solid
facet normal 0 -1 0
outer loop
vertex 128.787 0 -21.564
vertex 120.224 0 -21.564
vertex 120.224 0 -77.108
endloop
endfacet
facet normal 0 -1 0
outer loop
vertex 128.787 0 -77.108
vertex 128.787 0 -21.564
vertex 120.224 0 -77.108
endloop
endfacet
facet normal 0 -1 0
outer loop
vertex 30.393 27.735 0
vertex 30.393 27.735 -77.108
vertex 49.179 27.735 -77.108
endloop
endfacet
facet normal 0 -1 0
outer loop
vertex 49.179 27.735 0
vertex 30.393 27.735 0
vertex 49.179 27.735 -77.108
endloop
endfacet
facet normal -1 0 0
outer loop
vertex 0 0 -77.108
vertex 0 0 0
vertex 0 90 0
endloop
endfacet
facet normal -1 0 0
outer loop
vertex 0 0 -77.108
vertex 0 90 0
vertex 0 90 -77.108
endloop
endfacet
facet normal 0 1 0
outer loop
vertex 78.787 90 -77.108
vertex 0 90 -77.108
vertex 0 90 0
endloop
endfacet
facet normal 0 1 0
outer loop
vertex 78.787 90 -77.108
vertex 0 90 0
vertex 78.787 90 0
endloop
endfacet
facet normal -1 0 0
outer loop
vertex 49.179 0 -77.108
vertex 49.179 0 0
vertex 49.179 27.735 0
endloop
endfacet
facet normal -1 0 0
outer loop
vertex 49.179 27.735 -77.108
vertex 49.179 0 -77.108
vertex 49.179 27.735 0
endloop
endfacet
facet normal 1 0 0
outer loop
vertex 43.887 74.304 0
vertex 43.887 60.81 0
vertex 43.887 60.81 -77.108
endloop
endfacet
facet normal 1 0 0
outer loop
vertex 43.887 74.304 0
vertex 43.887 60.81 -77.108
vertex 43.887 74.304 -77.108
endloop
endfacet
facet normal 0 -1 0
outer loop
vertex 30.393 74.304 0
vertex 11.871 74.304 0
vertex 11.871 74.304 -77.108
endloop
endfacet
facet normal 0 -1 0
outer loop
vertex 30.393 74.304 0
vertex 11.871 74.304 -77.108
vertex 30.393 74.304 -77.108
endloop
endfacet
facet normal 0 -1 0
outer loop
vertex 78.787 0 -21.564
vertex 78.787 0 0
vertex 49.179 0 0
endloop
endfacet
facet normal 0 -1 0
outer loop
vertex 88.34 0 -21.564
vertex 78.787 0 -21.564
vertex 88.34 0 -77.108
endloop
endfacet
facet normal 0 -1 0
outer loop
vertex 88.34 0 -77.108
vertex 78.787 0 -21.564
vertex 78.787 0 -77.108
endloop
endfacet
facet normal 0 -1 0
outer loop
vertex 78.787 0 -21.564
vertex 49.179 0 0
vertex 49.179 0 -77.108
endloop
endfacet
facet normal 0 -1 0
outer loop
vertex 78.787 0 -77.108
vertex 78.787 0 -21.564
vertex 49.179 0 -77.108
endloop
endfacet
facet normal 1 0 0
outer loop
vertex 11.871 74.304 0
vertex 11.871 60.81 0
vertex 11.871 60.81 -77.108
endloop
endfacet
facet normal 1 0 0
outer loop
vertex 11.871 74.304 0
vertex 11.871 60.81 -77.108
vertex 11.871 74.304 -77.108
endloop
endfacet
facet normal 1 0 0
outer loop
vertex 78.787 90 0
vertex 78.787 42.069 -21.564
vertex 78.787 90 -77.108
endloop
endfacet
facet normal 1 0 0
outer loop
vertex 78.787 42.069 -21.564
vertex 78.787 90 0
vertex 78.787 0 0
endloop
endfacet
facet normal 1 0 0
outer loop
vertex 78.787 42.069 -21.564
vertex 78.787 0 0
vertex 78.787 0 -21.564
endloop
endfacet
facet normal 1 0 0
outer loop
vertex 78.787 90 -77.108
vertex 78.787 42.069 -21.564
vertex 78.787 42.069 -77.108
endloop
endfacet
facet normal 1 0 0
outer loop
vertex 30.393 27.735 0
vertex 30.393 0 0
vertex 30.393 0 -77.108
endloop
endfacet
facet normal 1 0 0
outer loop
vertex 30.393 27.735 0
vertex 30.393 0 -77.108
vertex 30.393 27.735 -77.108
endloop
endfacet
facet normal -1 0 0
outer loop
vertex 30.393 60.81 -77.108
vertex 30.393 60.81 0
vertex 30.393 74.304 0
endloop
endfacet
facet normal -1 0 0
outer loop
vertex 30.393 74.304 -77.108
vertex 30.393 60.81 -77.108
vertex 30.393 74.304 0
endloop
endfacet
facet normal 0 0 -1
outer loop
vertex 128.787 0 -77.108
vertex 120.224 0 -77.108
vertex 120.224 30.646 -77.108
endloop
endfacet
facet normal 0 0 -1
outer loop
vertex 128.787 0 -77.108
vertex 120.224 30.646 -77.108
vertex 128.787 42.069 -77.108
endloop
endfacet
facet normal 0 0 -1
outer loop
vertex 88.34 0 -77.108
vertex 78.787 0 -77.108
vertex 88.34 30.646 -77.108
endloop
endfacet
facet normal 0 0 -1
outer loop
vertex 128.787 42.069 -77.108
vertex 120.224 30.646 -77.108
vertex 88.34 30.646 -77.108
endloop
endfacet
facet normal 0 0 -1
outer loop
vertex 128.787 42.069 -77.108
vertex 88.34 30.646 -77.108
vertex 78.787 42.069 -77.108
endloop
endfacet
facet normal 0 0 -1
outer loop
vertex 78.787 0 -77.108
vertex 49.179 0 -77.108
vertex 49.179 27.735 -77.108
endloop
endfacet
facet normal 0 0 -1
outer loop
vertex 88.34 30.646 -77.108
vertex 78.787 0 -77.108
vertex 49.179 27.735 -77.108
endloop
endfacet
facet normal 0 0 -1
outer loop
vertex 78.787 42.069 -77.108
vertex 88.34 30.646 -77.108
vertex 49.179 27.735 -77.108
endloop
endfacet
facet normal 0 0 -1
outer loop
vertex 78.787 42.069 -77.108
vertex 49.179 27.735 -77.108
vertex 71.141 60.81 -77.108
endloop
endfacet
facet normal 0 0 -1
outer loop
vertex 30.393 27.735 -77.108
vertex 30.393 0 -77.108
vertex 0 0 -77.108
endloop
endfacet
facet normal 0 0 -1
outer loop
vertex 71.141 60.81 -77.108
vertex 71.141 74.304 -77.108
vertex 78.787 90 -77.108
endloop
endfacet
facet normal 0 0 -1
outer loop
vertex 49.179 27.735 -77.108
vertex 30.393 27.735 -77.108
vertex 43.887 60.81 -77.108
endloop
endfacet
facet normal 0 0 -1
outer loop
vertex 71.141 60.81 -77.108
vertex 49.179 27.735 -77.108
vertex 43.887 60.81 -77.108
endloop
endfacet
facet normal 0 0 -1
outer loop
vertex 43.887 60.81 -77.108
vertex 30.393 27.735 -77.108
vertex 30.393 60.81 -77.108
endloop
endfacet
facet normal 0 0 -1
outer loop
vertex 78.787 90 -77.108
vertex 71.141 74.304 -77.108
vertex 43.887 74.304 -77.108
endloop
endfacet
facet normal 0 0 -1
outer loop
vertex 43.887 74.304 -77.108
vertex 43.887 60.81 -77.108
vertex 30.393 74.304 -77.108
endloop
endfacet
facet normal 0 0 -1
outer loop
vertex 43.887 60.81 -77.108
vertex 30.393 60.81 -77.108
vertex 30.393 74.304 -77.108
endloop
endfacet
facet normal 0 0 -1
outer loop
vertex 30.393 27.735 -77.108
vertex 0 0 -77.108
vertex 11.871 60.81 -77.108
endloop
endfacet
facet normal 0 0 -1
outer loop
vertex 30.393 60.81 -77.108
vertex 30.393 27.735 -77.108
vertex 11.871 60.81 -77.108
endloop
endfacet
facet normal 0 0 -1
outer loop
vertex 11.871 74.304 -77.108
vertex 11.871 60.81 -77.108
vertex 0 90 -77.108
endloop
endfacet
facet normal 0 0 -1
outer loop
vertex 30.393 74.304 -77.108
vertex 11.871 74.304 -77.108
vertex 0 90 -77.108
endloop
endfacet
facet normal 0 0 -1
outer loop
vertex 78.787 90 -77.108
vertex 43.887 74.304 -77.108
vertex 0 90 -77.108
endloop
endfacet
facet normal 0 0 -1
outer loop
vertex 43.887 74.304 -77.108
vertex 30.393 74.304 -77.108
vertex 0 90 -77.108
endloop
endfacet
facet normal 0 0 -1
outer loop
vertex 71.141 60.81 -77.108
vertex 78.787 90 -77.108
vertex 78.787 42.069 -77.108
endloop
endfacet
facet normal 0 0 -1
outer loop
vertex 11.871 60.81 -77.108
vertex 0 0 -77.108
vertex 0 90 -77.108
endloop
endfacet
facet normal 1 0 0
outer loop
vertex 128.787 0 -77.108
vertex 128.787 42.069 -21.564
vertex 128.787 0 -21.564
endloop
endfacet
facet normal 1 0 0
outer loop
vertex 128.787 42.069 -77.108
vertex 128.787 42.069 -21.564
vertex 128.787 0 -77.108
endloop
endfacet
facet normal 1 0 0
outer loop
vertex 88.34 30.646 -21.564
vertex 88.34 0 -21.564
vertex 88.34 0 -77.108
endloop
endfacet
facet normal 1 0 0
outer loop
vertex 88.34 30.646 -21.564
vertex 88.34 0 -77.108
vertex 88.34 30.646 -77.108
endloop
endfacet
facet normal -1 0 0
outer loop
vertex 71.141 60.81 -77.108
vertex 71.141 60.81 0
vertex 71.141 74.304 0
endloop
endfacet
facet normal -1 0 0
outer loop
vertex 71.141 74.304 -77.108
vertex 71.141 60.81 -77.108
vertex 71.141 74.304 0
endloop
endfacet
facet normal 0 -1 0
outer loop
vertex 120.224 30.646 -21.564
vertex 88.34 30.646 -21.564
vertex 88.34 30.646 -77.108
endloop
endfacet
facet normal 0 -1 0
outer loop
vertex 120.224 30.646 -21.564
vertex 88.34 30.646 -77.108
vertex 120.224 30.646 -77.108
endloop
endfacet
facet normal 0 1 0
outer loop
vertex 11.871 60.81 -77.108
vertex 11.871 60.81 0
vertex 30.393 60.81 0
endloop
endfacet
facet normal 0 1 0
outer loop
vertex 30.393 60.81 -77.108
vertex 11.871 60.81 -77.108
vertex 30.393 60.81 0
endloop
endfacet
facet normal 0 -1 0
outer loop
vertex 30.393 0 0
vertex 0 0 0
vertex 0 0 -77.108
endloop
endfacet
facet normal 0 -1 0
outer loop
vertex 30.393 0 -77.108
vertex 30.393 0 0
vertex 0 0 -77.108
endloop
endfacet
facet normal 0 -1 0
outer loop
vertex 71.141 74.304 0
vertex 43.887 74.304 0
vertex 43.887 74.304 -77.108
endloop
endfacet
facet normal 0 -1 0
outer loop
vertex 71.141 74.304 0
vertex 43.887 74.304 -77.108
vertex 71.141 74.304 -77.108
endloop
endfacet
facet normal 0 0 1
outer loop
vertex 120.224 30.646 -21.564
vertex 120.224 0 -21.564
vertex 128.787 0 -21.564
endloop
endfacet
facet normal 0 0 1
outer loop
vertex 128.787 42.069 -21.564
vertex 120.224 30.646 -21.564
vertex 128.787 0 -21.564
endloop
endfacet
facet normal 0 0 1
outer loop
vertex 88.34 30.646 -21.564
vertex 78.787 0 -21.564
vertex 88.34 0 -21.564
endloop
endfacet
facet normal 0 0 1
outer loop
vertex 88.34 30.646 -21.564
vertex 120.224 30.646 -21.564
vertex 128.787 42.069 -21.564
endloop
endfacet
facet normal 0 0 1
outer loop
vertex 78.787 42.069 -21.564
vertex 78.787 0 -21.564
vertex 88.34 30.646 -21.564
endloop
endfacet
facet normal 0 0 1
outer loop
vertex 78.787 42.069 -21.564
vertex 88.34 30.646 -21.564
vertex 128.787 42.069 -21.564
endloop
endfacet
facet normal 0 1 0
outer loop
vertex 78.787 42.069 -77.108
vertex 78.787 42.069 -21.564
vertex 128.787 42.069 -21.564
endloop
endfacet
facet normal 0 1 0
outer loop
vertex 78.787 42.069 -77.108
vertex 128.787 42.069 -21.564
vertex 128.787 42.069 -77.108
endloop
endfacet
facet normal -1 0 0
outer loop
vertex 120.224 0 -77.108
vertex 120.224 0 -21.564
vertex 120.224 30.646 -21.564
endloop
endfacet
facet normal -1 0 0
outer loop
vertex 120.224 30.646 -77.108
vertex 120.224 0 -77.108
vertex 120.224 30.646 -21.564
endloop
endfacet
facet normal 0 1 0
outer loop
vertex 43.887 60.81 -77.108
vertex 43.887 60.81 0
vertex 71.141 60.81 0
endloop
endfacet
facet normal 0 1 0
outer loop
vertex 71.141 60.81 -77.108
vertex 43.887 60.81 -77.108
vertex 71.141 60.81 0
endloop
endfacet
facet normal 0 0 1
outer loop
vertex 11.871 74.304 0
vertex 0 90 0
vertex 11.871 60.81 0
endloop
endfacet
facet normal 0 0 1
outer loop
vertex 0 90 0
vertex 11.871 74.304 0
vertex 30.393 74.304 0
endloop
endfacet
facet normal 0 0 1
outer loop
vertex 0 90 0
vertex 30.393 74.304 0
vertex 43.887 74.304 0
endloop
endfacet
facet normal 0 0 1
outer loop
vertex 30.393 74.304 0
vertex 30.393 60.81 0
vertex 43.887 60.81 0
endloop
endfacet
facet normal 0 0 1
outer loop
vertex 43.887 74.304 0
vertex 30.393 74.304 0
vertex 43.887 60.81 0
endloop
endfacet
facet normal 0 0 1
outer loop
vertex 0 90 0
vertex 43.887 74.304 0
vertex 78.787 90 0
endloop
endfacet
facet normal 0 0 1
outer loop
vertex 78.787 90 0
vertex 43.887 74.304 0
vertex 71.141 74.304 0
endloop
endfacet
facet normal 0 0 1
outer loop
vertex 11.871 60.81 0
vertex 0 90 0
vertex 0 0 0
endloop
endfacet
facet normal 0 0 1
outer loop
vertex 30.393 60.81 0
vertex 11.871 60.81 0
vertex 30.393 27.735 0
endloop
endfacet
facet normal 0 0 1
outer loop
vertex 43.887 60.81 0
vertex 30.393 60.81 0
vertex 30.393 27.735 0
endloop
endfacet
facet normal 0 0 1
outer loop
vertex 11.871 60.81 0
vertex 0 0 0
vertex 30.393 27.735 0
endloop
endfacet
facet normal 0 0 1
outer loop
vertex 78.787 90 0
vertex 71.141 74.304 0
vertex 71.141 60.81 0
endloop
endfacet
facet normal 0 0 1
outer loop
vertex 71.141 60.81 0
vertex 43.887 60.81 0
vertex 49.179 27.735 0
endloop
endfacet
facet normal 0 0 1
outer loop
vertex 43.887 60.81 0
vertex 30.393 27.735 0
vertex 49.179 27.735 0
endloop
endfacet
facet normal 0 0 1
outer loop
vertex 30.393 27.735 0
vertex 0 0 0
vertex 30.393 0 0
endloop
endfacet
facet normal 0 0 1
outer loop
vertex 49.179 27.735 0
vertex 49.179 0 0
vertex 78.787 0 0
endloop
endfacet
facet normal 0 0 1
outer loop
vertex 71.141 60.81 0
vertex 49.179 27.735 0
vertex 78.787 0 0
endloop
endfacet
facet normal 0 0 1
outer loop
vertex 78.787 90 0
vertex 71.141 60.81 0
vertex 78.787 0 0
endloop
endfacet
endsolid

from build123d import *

# Parameters (mm, degrees)
ESQUISSE1_W             = 78.786961771
ESQUISSE1_H             = 77.107895372
BOSS_EXTRU_1_DEPTH      = 90
ESQUISSE3_W             = 55.543823951
ESQUISSE3_H             = 42.068648109
BOSS_EXTRU_3_DEPTH      = 50
ESQUISSE4_W             = 18.786498619
ESQUISSE4_H             = 27.73494317
ESQUISSE4_W_2           = 31.884127938
ESQUISSE4_H_2           = 30.645527463
ESQUISSE4_W_3           = 18.521900048
ESQUISSE4_H_3           = 13.494527178
ESQUISSE4_W_4           = 27.253652927
ENL_V_MAT_EXTRU_1_DEPTH = 110


with BuildPart() as part:
    # Esquisse1 → Boss.-Extru.1 (new body)
    with BuildSketch(Plane(origin=(0, 0, 0), x_dir=(1, 0, 0), z_dir=(0, 1, 0))):
        with Locations((39.393480886, 38.553947686)):
            Rectangle(ESQUISSE1_W, ESQUISSE1_H)
    extrude(amount=BOSS_EXTRU_1_DEPTH)

    # Esquisse3 → Boss.-Extru.3 (add)
    with BuildSketch(Plane(origin=(78.786961771, 0, 0), x_dir=(0, 0, -1), z_dir=(1, 0, 0))):
        with Locations((49.335983396, 21.034324055)):
            Rectangle(ESQUISSE3_W, ESQUISSE3_H)
    extrude(amount=BOSS_EXTRU_3_DEPTH)

    # Esquisse4 → Enlèv. mat.-Extru.1 (cut)
    with BuildSketch(Plane.XY):
        with Locations((39.78581368, 13.867471585)):
            Rectangle(ESQUISSE4_W, ESQUISSE4_H)
        with Locations((104.28171563, 15.322763732)):
            Rectangle(ESQUISSE4_W_2, ESQUISSE4_H_2)
        with Locations((21.131614346, 67.557028272)):
            Rectangle(ESQUISSE4_W_3, ESQUISSE4_H_3)
        with Locations((57.513918011, 67.557028272)):
            Rectangle(ESQUISSE4_W_4, ESQUISSE4_H_3)
    extrude(amount=-ENL_V_MAT_EXTRU_1_DEPTH, mode=Mode.SUBTRACT)


solid = part.part
